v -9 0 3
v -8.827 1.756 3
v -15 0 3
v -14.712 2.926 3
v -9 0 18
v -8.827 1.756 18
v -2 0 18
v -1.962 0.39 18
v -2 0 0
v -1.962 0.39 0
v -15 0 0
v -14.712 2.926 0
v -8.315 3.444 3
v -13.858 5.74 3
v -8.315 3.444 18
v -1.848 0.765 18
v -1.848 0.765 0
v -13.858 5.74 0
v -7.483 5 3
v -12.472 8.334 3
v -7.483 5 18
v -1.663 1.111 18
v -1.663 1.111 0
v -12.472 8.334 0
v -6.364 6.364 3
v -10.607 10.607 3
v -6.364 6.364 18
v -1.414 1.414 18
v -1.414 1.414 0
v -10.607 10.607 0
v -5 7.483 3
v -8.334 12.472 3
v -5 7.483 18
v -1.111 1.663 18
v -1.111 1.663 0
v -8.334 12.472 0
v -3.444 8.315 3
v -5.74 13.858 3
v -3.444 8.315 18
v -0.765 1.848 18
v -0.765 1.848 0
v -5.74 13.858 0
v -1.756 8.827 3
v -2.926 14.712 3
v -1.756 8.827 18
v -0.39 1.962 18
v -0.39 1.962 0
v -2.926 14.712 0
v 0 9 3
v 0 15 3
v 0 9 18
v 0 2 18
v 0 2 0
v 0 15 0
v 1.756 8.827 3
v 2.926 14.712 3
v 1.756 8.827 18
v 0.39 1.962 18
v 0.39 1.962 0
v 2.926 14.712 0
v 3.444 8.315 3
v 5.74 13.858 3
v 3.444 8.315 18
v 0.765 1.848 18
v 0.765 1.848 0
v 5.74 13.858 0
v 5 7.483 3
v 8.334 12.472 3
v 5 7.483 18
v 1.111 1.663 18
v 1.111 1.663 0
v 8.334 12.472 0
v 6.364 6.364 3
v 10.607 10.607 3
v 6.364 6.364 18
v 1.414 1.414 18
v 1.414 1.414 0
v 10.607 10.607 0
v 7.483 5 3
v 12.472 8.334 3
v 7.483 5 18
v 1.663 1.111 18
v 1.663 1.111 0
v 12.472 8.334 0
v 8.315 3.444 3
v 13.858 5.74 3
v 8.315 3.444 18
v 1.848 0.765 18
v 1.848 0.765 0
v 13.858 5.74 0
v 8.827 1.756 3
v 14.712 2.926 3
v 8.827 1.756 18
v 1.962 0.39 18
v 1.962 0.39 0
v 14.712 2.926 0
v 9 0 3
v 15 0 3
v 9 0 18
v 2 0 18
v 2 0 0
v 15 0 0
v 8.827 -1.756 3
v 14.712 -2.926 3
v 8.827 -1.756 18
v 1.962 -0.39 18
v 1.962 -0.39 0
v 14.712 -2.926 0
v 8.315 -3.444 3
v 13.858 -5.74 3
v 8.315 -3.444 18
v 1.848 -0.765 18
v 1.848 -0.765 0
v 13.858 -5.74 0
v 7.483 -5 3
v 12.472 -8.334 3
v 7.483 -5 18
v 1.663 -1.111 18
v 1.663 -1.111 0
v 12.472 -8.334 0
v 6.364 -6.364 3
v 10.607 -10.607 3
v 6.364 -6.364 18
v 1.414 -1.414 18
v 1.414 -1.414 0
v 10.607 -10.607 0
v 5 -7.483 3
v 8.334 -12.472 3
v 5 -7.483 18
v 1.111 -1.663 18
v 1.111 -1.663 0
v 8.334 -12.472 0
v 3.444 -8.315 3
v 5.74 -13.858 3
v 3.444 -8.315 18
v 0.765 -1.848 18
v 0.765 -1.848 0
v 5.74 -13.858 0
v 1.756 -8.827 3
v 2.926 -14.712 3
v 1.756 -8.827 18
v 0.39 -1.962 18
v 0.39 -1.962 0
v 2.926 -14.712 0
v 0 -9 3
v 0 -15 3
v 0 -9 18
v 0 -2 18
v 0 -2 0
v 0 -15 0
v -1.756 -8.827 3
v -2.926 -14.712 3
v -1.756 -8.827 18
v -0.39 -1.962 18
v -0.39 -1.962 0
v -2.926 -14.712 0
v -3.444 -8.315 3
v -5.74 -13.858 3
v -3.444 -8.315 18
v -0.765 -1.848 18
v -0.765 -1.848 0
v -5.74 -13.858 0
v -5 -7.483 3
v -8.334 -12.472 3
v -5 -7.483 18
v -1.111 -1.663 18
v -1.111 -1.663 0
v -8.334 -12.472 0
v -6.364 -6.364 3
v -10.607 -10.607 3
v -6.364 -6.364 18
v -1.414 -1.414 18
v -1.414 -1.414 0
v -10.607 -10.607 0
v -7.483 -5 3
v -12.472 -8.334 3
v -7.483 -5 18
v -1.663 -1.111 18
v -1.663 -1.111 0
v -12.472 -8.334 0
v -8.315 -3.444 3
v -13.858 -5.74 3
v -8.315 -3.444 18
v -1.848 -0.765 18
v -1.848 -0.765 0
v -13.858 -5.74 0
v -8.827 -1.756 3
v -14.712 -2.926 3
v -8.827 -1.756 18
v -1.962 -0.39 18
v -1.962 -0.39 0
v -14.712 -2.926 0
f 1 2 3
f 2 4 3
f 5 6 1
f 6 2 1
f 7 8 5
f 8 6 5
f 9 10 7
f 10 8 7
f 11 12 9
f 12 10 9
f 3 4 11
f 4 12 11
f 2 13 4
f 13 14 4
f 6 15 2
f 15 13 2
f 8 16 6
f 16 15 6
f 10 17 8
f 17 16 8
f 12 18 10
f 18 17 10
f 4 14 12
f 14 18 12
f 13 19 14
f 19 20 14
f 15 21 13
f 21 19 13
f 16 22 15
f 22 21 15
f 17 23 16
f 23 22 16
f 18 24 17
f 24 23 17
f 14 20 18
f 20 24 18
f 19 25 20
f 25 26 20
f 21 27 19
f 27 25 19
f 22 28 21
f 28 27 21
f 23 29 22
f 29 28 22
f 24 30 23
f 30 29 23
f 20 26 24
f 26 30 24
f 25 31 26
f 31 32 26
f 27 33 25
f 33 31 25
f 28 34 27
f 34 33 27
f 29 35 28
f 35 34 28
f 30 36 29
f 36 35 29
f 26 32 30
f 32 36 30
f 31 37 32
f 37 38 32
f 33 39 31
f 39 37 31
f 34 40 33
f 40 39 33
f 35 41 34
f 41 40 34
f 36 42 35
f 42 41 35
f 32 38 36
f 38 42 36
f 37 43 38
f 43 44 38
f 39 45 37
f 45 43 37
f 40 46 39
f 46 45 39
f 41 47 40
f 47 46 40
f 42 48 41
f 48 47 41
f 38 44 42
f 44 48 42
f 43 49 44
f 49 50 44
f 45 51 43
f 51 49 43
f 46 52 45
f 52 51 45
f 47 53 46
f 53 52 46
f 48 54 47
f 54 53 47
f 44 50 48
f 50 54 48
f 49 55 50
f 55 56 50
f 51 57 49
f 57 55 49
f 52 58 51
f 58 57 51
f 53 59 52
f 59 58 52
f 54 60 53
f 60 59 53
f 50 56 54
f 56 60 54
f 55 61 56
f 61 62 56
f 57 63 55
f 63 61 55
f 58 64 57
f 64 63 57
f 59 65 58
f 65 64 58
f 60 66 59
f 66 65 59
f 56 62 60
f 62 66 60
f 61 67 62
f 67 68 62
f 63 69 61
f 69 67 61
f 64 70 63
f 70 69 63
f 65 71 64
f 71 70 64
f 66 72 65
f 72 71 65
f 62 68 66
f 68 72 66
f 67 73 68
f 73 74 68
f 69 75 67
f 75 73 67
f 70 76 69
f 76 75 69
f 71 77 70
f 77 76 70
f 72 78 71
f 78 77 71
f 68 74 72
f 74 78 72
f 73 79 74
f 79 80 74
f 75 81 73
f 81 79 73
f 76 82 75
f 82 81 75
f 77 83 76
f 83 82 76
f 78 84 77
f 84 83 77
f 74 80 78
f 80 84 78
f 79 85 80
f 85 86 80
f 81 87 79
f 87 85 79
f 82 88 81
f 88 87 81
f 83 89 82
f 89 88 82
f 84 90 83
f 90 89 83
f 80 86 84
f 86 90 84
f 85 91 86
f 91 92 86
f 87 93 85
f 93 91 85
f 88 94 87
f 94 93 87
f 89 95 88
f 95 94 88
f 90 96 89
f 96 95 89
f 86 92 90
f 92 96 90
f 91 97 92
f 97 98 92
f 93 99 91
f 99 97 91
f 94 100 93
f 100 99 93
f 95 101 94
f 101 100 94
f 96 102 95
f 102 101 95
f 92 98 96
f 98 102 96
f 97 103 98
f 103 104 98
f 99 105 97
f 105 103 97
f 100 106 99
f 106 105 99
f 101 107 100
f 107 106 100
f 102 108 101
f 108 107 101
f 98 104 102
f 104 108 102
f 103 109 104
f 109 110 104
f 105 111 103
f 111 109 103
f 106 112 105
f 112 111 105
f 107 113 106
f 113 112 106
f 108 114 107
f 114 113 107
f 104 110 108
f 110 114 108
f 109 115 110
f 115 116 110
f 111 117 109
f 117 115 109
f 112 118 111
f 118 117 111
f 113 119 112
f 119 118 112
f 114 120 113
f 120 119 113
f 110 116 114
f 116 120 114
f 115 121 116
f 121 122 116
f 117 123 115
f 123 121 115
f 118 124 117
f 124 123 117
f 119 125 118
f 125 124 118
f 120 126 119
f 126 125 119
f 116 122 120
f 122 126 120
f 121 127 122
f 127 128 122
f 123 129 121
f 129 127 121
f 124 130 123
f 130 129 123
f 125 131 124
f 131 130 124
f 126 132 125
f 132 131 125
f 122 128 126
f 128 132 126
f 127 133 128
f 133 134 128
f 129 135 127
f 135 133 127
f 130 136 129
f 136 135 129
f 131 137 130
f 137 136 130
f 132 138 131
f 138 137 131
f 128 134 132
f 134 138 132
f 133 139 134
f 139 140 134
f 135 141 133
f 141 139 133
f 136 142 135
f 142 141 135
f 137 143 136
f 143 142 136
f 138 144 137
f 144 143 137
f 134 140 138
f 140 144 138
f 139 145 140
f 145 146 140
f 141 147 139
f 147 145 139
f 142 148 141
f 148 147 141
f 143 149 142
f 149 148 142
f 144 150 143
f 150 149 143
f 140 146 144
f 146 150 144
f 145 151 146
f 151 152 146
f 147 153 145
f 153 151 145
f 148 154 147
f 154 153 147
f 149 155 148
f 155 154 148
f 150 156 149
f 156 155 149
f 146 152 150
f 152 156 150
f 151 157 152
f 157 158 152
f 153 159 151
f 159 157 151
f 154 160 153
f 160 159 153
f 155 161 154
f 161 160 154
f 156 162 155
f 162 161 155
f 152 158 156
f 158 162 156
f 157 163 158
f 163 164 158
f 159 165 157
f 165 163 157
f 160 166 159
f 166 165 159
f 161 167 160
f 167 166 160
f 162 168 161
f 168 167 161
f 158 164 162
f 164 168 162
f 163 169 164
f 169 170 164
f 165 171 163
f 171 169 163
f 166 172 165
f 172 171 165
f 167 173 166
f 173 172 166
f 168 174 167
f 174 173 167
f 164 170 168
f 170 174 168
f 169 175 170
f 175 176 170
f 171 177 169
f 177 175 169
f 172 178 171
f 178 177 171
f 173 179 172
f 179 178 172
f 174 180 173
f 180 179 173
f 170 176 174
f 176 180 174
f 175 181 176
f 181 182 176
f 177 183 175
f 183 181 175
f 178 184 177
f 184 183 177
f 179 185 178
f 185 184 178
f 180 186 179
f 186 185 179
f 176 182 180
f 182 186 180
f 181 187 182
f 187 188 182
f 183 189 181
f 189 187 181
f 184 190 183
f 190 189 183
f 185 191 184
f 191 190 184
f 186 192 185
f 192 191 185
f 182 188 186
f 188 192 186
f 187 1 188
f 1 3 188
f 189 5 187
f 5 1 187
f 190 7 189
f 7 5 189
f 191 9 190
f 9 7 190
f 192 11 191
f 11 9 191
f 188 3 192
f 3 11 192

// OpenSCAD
$fn = 32;

// ----------------------------------------------------------------------
// Profiled standoff: flanged spacer, 18 mm long, bore 4 mm
// ----------------------------------------------------------------------

// --- parameters (mm) ---
revolve_angle = 360;      // full turn around the Z axis
profile_points = 6;       // points of the closed outline

profile = [[2, 0], [15, 0], [15, 3], [9, 3], [9, 18], [2, 18]];  // single closed polygon, 6 points, counter clockwise

// --- the one profile operation ---
rotate_extrude(angle = revolve_angle) polygon(points = profile);
